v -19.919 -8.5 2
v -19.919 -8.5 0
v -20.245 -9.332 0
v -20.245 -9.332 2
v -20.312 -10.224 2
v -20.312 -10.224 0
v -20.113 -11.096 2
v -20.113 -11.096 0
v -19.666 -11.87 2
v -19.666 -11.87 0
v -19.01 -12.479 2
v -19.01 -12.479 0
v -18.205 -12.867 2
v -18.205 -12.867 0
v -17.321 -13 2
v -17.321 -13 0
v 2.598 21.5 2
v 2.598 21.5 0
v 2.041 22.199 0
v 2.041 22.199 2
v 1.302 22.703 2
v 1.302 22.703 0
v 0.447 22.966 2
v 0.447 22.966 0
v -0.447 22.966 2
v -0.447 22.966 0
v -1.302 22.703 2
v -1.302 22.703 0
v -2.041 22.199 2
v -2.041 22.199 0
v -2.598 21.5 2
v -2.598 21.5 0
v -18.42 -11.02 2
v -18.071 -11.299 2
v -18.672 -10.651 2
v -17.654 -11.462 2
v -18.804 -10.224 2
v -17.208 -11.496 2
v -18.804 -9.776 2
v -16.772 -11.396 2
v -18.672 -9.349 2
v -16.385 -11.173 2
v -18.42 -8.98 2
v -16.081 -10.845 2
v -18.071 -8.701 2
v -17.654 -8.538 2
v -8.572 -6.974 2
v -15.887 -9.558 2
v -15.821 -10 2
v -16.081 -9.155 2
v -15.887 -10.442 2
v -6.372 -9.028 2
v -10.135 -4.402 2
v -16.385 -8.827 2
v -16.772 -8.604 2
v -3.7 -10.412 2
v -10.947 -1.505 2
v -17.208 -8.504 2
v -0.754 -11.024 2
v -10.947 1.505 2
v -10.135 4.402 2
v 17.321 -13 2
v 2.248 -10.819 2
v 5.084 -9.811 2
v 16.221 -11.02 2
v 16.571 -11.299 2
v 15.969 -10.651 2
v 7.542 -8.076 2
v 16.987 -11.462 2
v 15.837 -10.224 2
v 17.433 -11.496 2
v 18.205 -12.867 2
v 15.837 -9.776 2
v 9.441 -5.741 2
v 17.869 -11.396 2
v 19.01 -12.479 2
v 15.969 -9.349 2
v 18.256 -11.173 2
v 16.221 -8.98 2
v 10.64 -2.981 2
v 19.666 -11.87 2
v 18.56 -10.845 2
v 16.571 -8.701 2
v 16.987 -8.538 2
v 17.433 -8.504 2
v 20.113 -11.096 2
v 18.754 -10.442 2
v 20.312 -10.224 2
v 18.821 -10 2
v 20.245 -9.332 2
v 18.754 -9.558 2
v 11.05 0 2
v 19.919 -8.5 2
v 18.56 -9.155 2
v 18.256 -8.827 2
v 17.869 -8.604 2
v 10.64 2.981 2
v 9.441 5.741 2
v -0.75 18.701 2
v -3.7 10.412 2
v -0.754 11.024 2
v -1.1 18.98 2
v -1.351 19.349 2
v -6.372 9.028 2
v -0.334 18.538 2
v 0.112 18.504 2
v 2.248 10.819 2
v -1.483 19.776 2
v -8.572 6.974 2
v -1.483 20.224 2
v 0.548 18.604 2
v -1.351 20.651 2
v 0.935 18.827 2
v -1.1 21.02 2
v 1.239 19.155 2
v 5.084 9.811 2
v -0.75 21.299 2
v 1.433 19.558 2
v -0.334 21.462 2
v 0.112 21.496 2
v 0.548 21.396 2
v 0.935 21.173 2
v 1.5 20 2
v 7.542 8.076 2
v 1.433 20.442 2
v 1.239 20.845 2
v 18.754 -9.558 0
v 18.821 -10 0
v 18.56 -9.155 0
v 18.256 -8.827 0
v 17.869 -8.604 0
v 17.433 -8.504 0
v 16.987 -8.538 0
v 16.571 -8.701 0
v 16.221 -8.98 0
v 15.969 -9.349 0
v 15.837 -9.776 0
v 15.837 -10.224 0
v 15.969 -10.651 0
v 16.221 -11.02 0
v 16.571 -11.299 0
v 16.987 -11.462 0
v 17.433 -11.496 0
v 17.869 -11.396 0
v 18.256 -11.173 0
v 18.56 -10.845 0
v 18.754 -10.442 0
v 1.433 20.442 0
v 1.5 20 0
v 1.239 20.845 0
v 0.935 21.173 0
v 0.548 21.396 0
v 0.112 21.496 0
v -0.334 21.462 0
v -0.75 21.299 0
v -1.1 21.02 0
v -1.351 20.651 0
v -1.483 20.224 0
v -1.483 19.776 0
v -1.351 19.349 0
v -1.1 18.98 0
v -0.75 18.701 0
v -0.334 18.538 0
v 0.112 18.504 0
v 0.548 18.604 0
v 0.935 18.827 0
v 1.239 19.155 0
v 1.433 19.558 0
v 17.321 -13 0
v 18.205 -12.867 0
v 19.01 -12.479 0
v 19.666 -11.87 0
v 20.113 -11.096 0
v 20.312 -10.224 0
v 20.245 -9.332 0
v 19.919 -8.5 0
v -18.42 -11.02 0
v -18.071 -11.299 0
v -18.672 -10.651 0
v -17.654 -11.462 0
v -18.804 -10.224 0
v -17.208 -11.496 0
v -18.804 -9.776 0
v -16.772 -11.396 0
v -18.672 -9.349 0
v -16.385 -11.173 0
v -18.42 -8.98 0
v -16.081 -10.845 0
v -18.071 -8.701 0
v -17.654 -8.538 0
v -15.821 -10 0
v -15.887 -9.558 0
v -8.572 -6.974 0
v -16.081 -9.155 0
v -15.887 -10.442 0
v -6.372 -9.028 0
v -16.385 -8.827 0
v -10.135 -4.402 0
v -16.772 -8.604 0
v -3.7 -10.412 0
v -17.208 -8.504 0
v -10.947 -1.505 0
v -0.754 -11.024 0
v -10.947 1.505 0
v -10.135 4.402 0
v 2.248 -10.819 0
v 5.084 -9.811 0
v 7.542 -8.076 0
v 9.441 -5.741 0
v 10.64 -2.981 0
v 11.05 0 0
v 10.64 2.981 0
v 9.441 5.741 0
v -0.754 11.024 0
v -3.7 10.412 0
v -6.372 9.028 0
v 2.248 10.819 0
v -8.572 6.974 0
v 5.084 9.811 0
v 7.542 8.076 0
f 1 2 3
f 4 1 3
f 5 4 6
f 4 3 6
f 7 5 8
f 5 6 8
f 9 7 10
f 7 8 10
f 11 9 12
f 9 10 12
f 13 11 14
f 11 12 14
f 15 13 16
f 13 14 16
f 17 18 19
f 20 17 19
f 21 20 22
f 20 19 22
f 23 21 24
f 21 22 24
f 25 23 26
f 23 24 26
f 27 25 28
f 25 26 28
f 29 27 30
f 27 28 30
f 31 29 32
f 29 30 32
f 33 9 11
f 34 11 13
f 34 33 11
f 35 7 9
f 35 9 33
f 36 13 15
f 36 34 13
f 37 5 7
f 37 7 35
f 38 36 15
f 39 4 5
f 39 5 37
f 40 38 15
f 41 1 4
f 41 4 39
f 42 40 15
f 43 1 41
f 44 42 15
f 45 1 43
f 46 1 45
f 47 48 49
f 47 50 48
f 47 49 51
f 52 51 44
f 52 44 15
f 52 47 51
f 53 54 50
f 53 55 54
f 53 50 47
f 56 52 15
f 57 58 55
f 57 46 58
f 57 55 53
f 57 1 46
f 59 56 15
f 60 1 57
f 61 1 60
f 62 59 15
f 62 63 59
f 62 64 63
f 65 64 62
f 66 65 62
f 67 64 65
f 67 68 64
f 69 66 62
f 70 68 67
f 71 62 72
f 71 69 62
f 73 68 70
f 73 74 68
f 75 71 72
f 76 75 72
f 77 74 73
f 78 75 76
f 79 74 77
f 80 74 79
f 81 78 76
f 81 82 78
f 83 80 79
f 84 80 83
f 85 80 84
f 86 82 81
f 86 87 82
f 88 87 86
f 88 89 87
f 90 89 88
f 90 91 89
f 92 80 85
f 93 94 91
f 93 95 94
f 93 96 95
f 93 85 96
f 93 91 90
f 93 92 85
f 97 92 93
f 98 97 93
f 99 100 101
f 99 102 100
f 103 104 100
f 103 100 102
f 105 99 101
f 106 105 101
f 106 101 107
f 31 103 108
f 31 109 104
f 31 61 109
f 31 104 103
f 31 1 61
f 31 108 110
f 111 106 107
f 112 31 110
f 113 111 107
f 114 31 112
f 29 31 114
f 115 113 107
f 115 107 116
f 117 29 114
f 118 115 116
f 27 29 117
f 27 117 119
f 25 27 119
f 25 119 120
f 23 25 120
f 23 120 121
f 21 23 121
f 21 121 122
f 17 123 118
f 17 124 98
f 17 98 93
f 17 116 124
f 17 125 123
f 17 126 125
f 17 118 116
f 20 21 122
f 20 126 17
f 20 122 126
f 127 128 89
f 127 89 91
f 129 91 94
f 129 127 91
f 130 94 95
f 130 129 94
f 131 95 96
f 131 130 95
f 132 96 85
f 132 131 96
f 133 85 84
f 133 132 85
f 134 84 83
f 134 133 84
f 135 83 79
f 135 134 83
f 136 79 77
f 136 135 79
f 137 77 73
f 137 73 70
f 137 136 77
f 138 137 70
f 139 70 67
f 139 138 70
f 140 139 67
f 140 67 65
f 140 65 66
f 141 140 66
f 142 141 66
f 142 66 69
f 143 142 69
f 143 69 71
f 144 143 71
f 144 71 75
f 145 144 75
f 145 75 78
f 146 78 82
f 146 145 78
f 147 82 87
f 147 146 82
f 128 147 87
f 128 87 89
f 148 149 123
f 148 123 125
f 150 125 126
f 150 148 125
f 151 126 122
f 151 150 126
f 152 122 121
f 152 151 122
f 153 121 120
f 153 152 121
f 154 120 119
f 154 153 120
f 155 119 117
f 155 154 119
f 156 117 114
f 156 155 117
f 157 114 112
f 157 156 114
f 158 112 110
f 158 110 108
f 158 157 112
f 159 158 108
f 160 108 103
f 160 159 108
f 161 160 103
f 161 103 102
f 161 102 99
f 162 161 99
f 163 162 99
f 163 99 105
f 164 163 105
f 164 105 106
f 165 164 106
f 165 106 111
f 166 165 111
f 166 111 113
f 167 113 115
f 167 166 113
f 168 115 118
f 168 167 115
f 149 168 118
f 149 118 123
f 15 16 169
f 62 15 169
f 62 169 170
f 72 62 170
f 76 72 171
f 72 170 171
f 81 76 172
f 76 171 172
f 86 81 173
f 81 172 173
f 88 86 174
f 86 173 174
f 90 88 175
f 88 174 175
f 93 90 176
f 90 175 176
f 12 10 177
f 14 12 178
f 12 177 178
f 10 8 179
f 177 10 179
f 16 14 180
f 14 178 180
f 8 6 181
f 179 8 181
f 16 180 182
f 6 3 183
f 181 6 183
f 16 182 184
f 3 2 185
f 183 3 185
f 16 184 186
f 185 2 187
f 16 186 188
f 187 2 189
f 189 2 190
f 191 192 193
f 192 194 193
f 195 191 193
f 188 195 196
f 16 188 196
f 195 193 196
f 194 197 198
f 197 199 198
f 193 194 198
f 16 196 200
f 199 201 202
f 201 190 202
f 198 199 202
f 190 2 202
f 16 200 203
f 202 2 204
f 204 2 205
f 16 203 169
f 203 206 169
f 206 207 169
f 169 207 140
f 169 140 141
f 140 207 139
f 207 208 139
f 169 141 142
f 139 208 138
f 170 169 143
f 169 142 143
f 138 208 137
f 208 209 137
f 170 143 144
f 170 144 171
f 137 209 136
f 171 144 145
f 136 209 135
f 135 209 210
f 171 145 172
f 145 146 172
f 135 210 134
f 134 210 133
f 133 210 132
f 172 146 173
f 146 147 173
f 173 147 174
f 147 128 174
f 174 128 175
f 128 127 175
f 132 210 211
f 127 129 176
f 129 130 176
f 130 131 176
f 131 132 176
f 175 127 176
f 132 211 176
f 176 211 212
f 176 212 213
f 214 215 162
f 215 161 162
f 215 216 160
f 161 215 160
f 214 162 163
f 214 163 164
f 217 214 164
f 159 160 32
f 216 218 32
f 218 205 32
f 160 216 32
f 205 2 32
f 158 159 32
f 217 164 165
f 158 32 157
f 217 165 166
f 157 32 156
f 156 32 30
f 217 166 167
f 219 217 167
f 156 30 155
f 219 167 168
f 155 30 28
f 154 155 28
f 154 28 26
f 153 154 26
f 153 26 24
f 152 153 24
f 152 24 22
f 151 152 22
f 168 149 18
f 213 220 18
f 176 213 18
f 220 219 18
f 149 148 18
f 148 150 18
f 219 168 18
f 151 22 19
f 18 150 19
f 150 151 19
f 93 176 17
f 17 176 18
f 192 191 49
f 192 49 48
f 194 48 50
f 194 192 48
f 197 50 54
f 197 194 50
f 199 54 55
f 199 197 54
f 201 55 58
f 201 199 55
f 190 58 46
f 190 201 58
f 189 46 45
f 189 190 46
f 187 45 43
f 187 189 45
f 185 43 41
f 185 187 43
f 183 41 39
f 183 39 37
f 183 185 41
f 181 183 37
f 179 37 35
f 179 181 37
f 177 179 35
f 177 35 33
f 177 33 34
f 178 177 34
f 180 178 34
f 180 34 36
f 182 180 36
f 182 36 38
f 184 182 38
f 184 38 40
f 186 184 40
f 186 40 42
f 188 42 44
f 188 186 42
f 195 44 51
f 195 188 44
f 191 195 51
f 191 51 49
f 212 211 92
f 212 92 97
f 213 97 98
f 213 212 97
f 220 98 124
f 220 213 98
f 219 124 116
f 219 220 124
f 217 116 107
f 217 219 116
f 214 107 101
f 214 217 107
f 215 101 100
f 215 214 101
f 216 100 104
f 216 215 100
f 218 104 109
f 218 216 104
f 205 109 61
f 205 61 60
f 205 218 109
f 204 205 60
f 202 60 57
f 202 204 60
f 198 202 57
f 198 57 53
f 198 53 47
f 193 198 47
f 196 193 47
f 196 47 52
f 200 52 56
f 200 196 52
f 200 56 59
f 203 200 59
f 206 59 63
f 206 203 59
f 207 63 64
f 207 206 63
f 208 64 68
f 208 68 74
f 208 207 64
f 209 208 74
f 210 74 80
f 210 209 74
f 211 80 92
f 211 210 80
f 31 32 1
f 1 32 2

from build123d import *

# Parameters (mm, degrees)
SKETCH_1_R      = 1.5
SKETCH_1_R_2    = 11.05
EXTRUDE_1_DEPTH = 2


with BuildPart() as part:
    # 草图1 → 凸台-拉伸1 (new body)
    with BuildSketch(Plane.XY):
        with BuildLine():
            Line((-2.598076211, 21.5), (-19.918584287, -8.5))
            ThreePointArc((-19.918584287, -8.5), (-19.918584287, -11.5), (-17.320508076, -13))
            Line((-17.320508076, -13), (17.320508076, -13))
            ThreePointArc((17.320508076, -13), (19.918584287, -11.5), (19.918584287, -8.5))
            Line((19.918584287, -8.5), (2.598076211, 21.5))
            ThreePointArc((2.598076211, 21.5), (0, 23), (-2.598076211, 21.5))
        make_face()
        with Locations((-17.320508076, -10)):
            Circle(SKETCH_1_R, mode=Mode.SUBTRACT)
        with Locations((0, 20)):
            Circle(SKETCH_1_R, mode=Mode.SUBTRACT)
        with Locations((17.320508076, -10)):
            Circle(SKETCH_1_R, mode=Mode.SUBTRACT)
        Circle(SKETCH_1_R_2, mode=Mode.SUBTRACT)
    extrude(amount=EXTRUDE_1_DEPTH)


solid = part.part
